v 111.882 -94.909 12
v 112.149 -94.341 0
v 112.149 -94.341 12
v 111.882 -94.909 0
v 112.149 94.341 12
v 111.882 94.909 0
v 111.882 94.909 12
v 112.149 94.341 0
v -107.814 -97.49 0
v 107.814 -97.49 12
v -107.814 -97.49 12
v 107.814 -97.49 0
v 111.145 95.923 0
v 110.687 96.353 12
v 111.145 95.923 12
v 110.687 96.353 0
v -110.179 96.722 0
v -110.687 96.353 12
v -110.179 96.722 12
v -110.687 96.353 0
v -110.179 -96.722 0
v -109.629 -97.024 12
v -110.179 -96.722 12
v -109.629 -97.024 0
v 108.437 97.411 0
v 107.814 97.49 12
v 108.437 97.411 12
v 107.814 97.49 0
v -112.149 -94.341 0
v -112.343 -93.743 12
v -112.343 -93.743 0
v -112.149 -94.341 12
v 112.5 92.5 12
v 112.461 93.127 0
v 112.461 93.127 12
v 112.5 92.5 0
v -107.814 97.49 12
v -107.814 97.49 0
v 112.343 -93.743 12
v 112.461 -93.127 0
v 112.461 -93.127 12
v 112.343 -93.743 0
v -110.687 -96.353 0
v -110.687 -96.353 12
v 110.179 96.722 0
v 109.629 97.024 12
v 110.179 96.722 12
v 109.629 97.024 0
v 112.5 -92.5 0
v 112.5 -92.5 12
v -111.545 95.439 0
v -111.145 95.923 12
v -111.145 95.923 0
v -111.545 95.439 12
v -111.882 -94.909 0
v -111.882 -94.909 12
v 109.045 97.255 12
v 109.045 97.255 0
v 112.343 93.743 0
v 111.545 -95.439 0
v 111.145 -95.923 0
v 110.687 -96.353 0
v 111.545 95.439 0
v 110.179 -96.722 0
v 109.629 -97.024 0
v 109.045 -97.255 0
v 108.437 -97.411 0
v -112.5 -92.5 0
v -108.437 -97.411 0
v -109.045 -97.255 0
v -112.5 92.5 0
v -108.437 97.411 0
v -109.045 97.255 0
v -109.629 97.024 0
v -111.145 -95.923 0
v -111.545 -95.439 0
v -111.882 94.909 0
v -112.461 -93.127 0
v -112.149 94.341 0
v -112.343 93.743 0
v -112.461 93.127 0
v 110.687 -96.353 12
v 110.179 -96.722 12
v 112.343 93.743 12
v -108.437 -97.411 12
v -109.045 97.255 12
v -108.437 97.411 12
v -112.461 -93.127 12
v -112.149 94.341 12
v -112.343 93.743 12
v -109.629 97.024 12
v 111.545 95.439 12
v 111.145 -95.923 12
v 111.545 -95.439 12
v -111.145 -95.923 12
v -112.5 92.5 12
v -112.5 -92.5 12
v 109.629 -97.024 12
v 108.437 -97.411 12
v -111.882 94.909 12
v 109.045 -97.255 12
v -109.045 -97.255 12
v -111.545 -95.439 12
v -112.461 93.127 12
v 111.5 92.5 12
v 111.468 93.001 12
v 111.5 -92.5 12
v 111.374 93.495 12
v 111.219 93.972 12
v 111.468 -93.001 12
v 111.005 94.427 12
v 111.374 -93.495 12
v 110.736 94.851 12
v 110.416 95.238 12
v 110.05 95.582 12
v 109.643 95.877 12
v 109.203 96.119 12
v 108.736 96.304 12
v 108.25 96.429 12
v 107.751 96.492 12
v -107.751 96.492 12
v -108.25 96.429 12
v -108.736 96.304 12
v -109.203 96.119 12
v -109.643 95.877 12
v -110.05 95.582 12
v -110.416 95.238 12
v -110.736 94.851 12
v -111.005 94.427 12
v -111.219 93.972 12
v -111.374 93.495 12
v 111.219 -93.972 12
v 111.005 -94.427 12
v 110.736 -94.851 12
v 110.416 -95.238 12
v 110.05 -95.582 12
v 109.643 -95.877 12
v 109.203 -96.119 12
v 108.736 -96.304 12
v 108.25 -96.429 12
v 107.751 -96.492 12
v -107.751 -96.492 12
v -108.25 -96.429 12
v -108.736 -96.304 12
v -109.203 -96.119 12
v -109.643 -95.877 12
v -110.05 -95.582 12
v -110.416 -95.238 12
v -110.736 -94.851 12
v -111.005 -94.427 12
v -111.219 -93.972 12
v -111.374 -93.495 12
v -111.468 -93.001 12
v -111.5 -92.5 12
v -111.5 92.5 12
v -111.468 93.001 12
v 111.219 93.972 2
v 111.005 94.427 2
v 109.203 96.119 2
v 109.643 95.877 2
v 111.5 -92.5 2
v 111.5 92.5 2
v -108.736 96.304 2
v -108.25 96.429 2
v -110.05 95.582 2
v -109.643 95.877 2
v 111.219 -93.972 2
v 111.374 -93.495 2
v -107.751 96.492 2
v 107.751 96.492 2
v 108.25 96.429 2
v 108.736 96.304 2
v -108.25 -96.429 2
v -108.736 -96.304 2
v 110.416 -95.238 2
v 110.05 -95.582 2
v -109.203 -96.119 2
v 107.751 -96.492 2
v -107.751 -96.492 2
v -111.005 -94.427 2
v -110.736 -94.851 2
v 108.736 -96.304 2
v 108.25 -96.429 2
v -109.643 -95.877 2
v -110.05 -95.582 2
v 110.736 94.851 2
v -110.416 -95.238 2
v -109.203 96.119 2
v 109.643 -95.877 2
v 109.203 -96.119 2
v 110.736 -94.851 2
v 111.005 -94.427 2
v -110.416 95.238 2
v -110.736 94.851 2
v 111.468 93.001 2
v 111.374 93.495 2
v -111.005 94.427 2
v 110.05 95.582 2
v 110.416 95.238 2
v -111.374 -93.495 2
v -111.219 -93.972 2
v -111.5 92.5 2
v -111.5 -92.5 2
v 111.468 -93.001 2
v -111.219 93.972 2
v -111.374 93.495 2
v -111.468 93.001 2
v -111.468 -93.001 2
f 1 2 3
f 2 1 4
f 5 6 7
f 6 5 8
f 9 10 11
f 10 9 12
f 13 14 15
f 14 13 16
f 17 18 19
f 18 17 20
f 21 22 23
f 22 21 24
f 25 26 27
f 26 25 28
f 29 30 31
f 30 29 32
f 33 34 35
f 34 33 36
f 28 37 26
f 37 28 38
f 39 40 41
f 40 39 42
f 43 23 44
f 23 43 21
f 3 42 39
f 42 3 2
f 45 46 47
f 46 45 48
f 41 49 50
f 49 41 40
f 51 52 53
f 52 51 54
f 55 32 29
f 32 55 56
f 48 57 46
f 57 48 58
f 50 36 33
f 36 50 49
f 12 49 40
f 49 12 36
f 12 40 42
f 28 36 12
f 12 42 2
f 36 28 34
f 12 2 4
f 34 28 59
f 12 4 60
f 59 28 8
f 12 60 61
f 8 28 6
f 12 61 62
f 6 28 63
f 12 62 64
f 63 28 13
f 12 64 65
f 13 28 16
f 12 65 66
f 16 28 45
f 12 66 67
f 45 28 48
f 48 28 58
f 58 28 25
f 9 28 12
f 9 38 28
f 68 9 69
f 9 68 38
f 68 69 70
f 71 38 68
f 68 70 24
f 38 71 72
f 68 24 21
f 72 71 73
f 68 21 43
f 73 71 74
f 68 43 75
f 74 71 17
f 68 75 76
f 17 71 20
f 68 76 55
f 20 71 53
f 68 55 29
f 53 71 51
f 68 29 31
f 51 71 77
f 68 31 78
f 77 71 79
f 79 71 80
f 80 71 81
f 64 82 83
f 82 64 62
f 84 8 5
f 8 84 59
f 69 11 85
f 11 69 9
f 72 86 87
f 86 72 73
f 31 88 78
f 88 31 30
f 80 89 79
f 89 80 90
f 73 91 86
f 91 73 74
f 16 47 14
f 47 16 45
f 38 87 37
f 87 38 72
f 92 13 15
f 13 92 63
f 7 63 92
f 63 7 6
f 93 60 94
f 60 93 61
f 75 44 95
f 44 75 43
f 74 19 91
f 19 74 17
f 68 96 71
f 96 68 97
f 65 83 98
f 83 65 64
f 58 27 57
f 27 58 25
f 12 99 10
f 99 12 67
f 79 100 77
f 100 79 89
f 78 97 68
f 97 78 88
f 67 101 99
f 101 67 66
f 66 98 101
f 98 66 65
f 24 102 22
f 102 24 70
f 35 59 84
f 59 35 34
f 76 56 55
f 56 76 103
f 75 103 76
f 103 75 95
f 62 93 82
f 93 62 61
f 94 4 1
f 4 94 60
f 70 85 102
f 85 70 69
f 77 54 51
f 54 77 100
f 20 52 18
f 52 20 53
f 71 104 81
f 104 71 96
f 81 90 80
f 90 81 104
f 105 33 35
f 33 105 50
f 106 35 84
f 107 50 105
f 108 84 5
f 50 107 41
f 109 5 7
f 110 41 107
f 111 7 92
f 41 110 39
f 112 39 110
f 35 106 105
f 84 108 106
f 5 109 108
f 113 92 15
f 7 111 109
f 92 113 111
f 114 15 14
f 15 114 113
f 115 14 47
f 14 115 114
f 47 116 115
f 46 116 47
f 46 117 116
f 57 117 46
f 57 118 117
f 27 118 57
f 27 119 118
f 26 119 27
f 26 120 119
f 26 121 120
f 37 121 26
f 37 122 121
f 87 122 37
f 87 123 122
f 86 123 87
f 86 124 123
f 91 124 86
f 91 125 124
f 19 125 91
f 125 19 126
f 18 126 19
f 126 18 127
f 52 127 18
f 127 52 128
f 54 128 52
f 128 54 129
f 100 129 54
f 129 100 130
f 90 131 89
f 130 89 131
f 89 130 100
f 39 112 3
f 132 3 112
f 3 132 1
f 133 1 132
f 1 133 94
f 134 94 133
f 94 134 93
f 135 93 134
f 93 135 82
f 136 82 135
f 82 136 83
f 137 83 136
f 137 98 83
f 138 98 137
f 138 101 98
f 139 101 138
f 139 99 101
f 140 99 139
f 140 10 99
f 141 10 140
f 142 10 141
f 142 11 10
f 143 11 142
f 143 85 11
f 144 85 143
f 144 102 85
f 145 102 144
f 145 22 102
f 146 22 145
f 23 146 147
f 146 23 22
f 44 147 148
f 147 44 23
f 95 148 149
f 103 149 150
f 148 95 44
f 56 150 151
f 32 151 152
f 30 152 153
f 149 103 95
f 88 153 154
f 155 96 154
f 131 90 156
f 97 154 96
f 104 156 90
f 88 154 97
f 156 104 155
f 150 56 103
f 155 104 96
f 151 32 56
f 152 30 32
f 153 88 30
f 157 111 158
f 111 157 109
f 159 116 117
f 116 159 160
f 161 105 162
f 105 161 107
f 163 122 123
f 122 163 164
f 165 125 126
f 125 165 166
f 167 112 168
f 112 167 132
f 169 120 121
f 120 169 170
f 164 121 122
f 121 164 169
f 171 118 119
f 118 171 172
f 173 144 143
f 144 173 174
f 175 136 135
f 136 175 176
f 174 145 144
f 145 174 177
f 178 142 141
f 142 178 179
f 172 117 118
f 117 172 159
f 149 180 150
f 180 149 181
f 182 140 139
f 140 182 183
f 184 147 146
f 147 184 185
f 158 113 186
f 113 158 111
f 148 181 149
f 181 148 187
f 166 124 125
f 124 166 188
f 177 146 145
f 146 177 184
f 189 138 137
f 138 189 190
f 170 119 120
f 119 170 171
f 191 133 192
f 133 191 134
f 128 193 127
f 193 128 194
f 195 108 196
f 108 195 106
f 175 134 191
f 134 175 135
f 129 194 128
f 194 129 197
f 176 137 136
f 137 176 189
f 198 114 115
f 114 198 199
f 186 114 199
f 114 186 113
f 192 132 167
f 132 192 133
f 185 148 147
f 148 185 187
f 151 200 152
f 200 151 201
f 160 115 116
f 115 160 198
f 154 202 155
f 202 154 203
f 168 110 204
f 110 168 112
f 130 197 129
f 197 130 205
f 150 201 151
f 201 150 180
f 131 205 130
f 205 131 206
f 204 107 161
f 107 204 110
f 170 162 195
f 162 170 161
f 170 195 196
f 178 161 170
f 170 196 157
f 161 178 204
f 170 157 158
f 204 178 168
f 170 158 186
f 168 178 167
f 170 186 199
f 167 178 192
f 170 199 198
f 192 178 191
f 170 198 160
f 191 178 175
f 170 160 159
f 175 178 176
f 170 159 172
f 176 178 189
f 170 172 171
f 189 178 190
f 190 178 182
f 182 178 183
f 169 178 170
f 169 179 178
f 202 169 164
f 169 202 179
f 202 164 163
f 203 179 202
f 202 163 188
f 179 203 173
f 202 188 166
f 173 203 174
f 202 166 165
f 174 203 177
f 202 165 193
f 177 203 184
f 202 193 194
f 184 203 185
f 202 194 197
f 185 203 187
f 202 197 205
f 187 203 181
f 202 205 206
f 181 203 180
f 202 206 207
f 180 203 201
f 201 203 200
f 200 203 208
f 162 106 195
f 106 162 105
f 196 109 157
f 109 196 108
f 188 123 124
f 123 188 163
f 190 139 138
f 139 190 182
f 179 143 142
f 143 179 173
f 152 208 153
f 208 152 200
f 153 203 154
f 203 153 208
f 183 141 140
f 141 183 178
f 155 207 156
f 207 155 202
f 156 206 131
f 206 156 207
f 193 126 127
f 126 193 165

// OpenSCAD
$fn = 50;


difference() {
	union() {
		hull() {
			translate(v = [-107.5000000000, 92.5000000000, 0]) {
				cylinder(h = 12, r = 5);
			}
			translate(v = [107.5000000000, 92.5000000000, 0]) {
				cylinder(h = 12, r = 5);
			}
			translate(v = [-107.5000000000, -92.5000000000, 0]) {
				cylinder(h = 12, r = 5);
			}
			translate(v = [107.5000000000, -92.5000000000, 0]) {
				cylinder(h = 12, r = 5);
			}
		}
	}
	union() {
		translate(v = [0, 0, 2]) {
			hull() {
				translate(v = [-107.5000000000, 92.5000000000, 0]) {
					cylinder(h = 10, r = 4);
				}
				translate(v = [107.5000000000, 92.5000000000, 0]) {
					cylinder(h = 10, r = 4);
				}
				translate(v = [-107.5000000000, -92.5000000000, 0]) {
					cylinder(h = 10, r = 4);
				}
				translate(v = [107.5000000000, -92.5000000000, 0]) {
					cylinder(h = 10, r = 4);
				}
			}
		}
	}
}
